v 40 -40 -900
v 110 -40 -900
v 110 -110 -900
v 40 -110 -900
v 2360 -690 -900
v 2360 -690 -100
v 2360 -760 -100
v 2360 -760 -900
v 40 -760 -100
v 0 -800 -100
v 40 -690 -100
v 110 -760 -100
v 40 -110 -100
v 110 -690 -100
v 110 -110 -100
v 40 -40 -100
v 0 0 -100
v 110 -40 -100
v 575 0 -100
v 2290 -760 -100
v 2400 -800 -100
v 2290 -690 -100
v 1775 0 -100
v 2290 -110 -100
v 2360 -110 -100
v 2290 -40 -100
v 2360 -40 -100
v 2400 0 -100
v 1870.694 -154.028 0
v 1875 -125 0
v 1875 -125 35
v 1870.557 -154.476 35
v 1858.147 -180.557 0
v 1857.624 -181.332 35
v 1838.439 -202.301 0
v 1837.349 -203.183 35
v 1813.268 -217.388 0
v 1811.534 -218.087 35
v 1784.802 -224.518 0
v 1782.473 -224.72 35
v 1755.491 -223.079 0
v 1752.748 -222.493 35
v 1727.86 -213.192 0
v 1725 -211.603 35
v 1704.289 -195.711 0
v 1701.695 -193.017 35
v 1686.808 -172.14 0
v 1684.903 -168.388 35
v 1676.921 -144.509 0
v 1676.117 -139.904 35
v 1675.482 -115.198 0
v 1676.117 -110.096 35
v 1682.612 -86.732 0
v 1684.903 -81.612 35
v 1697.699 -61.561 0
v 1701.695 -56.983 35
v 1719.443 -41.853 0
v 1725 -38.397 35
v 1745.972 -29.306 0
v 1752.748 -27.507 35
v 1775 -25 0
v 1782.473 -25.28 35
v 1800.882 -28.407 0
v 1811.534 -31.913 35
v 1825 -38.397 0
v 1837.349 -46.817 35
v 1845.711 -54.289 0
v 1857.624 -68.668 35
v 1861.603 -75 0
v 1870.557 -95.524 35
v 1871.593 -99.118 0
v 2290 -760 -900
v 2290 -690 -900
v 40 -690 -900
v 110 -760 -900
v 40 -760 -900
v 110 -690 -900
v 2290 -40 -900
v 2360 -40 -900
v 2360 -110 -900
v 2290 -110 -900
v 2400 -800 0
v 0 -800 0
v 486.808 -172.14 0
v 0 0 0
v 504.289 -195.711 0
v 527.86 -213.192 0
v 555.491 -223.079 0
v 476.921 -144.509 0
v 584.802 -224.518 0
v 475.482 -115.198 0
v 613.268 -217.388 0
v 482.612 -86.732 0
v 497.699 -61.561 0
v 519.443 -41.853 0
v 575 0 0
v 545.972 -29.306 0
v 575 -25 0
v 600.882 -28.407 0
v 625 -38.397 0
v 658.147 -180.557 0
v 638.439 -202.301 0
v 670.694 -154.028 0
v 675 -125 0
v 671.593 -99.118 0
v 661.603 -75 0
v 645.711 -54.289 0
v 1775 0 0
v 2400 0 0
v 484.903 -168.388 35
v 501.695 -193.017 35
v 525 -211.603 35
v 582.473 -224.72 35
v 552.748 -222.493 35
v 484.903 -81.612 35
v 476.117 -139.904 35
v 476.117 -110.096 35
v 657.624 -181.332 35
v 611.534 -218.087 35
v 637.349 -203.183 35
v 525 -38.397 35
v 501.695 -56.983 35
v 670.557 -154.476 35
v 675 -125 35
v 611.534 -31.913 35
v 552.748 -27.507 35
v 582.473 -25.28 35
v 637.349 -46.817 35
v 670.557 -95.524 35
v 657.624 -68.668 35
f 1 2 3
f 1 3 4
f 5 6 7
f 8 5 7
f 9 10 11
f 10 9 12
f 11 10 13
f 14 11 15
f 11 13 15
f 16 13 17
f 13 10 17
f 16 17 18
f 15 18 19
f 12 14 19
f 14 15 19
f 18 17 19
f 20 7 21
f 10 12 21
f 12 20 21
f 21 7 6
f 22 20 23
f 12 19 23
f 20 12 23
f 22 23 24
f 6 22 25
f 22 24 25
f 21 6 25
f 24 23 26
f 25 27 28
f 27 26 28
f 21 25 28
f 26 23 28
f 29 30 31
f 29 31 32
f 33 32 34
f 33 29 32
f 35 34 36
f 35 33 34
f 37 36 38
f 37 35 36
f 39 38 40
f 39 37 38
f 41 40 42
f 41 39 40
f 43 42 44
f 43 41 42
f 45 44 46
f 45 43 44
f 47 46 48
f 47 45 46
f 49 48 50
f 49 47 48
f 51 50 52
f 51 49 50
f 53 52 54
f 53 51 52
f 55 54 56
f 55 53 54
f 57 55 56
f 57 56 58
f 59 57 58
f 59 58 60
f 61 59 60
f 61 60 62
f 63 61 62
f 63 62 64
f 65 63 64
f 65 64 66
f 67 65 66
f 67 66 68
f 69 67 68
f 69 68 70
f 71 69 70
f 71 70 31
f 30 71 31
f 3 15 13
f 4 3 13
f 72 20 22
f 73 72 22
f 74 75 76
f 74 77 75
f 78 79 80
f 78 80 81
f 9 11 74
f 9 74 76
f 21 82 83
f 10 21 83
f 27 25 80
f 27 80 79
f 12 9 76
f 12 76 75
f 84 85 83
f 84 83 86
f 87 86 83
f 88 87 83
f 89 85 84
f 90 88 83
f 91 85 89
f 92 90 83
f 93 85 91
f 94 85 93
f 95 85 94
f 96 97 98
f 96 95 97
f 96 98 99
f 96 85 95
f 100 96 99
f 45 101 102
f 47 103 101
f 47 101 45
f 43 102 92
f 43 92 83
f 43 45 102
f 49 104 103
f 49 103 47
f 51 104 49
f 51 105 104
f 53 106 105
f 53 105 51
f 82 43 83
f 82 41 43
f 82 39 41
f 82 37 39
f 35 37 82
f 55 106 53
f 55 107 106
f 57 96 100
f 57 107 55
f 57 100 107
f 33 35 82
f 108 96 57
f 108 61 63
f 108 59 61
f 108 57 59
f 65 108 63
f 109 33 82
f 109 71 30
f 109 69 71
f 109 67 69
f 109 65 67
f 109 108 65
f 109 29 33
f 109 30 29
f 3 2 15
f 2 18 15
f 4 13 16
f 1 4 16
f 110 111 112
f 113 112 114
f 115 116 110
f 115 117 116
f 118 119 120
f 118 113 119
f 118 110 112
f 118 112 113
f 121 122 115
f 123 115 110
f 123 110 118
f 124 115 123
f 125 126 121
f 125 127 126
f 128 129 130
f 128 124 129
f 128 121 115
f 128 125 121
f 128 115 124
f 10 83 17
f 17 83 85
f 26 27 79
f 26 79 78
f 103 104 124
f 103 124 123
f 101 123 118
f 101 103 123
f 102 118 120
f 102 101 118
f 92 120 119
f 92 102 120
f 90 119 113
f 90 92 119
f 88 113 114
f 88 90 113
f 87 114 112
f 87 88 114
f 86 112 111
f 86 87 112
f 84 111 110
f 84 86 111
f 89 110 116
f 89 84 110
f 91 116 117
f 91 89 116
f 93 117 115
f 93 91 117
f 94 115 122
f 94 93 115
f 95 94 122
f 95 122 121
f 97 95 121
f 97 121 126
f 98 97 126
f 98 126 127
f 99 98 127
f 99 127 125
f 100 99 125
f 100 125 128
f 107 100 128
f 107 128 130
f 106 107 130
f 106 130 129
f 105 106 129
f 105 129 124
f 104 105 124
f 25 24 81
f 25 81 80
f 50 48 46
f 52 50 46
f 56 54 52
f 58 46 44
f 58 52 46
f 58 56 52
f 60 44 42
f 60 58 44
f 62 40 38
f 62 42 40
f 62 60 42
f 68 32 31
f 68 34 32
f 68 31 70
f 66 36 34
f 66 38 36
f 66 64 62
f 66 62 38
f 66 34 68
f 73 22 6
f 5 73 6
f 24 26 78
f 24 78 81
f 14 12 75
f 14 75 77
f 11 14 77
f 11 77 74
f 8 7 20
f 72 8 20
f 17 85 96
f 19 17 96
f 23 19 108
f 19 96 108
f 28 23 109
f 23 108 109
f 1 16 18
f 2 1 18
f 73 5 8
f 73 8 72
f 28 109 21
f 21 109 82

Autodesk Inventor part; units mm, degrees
ref_plane "YZ Plane" through (0, 0, 0) normal (1, 0, 0) x (0, 1, 0)
ref_plane "XZ Plane" through (0, 0, 0) normal (0, 1, 0) x (-1, 0, 0)
ref_plane "XY Plane" through (0, 0, 0) normal (0, 0, 1) x (1, 0, 0)
sketch "Sketch1" plane through (0, 0, 0) normal (0, 0, 1) x (1, 0, 0)
  line L0 (0, 0) -> (2400, 0)
  line L1 (2400, 0) -> (2400, -800)
  line L2 (2400, -800) -> (0, -800)
  line L3 (0, -800) -> (0, 0)
  line L4 (0, 0) -> (575, 0)
  line L5 (575, 0) -> (575, -125)
  line L6 (0, 0) -> (1775, 0)
  line L7 (1775, 0) -> (1775, -125)
  circle A0 centre (575, -125) radius 100
  circle A1 centre (1775, -125) radius 100
  dimension "d0" = 2400
  dimension "d1" = 800
  dimension "d2" = 575
  dimension "d3" = 125
  dimension "d4" = 1775
  dimension "d5" = 200
extrude "Extrusion1" add sketch "Sketch1" along normal blind 35 contours A1 | A0
extrude "Extrusion2" add sketch "Sketch1" against normal blind 100
sketch "Sketch2" plane through (575, -125, 35) normal (0, 0, 1) x (1, 0, 0)
  point P0 (-575, 125)
extrude "Extrusion3" add sketch "Sketch1" against normal blind 100 contours A0
extrude "Extrusion4" add sketch "Sketch1" against normal blind 100 contours A1
sketch "Sketch3" plane through (0, 0, -100) normal (0, 0, -1) x (-1, 0, 0)
  point P0 (0, 0)
sketch "Sketch4" plane through (0, 0, -100) normal (0, 0, -1) x (-1, 0, 0)
  line L0 (0, 0) -> (-2400, 0) projected
  line L1 (0, 0) -> (0, -40)
  line L2 (0, -800) -> (0, 0) projected
  line L3 (0, -40) -> (-40, -40)
  line L4 (-40, -40) -> (-110, -40)
  line L5 (-110, -40) -> (-110, -110)
  line L6 (-110, -110) -> (-40, -110)
  line L7 (-40, -110) -> (-40, -40)
  line L8 (-2400, -800) -> (0, -800) projected
  line L9 (0, -800) -> (-40, -800)
  line L10 (0, -760) -> (0, -800)
  line L11 (-40, -760) -> (-110, -760)
  line L12 (-110, -760) -> (-110, -690)
  line L13 (-110, -690) -> (-40, -690)
  line L14 (-40, -690) -> (-40, -760)
  line L15 (-2400, 0) -> (-2400, -800) projected
  line L16 (-2400, 0) -> (-2400, -40)
  line L17 (-2400, -40) -> (-2360, -40)
  line L18 (-2400, -800) -> (-2400, -760)
  line L19 (-2400, -760) -> (-2360, -760)
  line L20 (-2360, -40) -> (-2290, -40)
  line L21 (-2290, -40) -> (-2290, -110)
  line L22 (-2290, -110) -> (-2360, -110)
  line L23 (-2360, -110) -> (-2360, -40)
  line L24 (-2360, -760) -> (-2290, -760)
  line L25 (-2290, -760) -> (-2290, -690)
  line L26 (-2290, -690) -> (-2360, -690)
  line L27 (-2360, -690) -> (-2360, -760)
  dimension "d14" = 40
  dimension "d15" = 40
  dimension "d16" = 70
  dimension "d17" = 70
  dimension "d18" = 40
  dimension "d19" = 40
  dimension "d20" = 70
  dimension "d21" = 70
  dimension "d22" = 40
  dimension "d23" = 40
  dimension "d24" = 70
  dimension "d25" = 70
  dimension "d26" = 70
  dimension "d27" = 70
extrude "Extrusion5" add sketch "Sketch4" along normal blind 800 contours L20 L21 L22 L23 | L27 L26 L25 L24 | L7 L6 L5 L4 | L11 L12 L13 L14
properties part number "Master-workspace"
